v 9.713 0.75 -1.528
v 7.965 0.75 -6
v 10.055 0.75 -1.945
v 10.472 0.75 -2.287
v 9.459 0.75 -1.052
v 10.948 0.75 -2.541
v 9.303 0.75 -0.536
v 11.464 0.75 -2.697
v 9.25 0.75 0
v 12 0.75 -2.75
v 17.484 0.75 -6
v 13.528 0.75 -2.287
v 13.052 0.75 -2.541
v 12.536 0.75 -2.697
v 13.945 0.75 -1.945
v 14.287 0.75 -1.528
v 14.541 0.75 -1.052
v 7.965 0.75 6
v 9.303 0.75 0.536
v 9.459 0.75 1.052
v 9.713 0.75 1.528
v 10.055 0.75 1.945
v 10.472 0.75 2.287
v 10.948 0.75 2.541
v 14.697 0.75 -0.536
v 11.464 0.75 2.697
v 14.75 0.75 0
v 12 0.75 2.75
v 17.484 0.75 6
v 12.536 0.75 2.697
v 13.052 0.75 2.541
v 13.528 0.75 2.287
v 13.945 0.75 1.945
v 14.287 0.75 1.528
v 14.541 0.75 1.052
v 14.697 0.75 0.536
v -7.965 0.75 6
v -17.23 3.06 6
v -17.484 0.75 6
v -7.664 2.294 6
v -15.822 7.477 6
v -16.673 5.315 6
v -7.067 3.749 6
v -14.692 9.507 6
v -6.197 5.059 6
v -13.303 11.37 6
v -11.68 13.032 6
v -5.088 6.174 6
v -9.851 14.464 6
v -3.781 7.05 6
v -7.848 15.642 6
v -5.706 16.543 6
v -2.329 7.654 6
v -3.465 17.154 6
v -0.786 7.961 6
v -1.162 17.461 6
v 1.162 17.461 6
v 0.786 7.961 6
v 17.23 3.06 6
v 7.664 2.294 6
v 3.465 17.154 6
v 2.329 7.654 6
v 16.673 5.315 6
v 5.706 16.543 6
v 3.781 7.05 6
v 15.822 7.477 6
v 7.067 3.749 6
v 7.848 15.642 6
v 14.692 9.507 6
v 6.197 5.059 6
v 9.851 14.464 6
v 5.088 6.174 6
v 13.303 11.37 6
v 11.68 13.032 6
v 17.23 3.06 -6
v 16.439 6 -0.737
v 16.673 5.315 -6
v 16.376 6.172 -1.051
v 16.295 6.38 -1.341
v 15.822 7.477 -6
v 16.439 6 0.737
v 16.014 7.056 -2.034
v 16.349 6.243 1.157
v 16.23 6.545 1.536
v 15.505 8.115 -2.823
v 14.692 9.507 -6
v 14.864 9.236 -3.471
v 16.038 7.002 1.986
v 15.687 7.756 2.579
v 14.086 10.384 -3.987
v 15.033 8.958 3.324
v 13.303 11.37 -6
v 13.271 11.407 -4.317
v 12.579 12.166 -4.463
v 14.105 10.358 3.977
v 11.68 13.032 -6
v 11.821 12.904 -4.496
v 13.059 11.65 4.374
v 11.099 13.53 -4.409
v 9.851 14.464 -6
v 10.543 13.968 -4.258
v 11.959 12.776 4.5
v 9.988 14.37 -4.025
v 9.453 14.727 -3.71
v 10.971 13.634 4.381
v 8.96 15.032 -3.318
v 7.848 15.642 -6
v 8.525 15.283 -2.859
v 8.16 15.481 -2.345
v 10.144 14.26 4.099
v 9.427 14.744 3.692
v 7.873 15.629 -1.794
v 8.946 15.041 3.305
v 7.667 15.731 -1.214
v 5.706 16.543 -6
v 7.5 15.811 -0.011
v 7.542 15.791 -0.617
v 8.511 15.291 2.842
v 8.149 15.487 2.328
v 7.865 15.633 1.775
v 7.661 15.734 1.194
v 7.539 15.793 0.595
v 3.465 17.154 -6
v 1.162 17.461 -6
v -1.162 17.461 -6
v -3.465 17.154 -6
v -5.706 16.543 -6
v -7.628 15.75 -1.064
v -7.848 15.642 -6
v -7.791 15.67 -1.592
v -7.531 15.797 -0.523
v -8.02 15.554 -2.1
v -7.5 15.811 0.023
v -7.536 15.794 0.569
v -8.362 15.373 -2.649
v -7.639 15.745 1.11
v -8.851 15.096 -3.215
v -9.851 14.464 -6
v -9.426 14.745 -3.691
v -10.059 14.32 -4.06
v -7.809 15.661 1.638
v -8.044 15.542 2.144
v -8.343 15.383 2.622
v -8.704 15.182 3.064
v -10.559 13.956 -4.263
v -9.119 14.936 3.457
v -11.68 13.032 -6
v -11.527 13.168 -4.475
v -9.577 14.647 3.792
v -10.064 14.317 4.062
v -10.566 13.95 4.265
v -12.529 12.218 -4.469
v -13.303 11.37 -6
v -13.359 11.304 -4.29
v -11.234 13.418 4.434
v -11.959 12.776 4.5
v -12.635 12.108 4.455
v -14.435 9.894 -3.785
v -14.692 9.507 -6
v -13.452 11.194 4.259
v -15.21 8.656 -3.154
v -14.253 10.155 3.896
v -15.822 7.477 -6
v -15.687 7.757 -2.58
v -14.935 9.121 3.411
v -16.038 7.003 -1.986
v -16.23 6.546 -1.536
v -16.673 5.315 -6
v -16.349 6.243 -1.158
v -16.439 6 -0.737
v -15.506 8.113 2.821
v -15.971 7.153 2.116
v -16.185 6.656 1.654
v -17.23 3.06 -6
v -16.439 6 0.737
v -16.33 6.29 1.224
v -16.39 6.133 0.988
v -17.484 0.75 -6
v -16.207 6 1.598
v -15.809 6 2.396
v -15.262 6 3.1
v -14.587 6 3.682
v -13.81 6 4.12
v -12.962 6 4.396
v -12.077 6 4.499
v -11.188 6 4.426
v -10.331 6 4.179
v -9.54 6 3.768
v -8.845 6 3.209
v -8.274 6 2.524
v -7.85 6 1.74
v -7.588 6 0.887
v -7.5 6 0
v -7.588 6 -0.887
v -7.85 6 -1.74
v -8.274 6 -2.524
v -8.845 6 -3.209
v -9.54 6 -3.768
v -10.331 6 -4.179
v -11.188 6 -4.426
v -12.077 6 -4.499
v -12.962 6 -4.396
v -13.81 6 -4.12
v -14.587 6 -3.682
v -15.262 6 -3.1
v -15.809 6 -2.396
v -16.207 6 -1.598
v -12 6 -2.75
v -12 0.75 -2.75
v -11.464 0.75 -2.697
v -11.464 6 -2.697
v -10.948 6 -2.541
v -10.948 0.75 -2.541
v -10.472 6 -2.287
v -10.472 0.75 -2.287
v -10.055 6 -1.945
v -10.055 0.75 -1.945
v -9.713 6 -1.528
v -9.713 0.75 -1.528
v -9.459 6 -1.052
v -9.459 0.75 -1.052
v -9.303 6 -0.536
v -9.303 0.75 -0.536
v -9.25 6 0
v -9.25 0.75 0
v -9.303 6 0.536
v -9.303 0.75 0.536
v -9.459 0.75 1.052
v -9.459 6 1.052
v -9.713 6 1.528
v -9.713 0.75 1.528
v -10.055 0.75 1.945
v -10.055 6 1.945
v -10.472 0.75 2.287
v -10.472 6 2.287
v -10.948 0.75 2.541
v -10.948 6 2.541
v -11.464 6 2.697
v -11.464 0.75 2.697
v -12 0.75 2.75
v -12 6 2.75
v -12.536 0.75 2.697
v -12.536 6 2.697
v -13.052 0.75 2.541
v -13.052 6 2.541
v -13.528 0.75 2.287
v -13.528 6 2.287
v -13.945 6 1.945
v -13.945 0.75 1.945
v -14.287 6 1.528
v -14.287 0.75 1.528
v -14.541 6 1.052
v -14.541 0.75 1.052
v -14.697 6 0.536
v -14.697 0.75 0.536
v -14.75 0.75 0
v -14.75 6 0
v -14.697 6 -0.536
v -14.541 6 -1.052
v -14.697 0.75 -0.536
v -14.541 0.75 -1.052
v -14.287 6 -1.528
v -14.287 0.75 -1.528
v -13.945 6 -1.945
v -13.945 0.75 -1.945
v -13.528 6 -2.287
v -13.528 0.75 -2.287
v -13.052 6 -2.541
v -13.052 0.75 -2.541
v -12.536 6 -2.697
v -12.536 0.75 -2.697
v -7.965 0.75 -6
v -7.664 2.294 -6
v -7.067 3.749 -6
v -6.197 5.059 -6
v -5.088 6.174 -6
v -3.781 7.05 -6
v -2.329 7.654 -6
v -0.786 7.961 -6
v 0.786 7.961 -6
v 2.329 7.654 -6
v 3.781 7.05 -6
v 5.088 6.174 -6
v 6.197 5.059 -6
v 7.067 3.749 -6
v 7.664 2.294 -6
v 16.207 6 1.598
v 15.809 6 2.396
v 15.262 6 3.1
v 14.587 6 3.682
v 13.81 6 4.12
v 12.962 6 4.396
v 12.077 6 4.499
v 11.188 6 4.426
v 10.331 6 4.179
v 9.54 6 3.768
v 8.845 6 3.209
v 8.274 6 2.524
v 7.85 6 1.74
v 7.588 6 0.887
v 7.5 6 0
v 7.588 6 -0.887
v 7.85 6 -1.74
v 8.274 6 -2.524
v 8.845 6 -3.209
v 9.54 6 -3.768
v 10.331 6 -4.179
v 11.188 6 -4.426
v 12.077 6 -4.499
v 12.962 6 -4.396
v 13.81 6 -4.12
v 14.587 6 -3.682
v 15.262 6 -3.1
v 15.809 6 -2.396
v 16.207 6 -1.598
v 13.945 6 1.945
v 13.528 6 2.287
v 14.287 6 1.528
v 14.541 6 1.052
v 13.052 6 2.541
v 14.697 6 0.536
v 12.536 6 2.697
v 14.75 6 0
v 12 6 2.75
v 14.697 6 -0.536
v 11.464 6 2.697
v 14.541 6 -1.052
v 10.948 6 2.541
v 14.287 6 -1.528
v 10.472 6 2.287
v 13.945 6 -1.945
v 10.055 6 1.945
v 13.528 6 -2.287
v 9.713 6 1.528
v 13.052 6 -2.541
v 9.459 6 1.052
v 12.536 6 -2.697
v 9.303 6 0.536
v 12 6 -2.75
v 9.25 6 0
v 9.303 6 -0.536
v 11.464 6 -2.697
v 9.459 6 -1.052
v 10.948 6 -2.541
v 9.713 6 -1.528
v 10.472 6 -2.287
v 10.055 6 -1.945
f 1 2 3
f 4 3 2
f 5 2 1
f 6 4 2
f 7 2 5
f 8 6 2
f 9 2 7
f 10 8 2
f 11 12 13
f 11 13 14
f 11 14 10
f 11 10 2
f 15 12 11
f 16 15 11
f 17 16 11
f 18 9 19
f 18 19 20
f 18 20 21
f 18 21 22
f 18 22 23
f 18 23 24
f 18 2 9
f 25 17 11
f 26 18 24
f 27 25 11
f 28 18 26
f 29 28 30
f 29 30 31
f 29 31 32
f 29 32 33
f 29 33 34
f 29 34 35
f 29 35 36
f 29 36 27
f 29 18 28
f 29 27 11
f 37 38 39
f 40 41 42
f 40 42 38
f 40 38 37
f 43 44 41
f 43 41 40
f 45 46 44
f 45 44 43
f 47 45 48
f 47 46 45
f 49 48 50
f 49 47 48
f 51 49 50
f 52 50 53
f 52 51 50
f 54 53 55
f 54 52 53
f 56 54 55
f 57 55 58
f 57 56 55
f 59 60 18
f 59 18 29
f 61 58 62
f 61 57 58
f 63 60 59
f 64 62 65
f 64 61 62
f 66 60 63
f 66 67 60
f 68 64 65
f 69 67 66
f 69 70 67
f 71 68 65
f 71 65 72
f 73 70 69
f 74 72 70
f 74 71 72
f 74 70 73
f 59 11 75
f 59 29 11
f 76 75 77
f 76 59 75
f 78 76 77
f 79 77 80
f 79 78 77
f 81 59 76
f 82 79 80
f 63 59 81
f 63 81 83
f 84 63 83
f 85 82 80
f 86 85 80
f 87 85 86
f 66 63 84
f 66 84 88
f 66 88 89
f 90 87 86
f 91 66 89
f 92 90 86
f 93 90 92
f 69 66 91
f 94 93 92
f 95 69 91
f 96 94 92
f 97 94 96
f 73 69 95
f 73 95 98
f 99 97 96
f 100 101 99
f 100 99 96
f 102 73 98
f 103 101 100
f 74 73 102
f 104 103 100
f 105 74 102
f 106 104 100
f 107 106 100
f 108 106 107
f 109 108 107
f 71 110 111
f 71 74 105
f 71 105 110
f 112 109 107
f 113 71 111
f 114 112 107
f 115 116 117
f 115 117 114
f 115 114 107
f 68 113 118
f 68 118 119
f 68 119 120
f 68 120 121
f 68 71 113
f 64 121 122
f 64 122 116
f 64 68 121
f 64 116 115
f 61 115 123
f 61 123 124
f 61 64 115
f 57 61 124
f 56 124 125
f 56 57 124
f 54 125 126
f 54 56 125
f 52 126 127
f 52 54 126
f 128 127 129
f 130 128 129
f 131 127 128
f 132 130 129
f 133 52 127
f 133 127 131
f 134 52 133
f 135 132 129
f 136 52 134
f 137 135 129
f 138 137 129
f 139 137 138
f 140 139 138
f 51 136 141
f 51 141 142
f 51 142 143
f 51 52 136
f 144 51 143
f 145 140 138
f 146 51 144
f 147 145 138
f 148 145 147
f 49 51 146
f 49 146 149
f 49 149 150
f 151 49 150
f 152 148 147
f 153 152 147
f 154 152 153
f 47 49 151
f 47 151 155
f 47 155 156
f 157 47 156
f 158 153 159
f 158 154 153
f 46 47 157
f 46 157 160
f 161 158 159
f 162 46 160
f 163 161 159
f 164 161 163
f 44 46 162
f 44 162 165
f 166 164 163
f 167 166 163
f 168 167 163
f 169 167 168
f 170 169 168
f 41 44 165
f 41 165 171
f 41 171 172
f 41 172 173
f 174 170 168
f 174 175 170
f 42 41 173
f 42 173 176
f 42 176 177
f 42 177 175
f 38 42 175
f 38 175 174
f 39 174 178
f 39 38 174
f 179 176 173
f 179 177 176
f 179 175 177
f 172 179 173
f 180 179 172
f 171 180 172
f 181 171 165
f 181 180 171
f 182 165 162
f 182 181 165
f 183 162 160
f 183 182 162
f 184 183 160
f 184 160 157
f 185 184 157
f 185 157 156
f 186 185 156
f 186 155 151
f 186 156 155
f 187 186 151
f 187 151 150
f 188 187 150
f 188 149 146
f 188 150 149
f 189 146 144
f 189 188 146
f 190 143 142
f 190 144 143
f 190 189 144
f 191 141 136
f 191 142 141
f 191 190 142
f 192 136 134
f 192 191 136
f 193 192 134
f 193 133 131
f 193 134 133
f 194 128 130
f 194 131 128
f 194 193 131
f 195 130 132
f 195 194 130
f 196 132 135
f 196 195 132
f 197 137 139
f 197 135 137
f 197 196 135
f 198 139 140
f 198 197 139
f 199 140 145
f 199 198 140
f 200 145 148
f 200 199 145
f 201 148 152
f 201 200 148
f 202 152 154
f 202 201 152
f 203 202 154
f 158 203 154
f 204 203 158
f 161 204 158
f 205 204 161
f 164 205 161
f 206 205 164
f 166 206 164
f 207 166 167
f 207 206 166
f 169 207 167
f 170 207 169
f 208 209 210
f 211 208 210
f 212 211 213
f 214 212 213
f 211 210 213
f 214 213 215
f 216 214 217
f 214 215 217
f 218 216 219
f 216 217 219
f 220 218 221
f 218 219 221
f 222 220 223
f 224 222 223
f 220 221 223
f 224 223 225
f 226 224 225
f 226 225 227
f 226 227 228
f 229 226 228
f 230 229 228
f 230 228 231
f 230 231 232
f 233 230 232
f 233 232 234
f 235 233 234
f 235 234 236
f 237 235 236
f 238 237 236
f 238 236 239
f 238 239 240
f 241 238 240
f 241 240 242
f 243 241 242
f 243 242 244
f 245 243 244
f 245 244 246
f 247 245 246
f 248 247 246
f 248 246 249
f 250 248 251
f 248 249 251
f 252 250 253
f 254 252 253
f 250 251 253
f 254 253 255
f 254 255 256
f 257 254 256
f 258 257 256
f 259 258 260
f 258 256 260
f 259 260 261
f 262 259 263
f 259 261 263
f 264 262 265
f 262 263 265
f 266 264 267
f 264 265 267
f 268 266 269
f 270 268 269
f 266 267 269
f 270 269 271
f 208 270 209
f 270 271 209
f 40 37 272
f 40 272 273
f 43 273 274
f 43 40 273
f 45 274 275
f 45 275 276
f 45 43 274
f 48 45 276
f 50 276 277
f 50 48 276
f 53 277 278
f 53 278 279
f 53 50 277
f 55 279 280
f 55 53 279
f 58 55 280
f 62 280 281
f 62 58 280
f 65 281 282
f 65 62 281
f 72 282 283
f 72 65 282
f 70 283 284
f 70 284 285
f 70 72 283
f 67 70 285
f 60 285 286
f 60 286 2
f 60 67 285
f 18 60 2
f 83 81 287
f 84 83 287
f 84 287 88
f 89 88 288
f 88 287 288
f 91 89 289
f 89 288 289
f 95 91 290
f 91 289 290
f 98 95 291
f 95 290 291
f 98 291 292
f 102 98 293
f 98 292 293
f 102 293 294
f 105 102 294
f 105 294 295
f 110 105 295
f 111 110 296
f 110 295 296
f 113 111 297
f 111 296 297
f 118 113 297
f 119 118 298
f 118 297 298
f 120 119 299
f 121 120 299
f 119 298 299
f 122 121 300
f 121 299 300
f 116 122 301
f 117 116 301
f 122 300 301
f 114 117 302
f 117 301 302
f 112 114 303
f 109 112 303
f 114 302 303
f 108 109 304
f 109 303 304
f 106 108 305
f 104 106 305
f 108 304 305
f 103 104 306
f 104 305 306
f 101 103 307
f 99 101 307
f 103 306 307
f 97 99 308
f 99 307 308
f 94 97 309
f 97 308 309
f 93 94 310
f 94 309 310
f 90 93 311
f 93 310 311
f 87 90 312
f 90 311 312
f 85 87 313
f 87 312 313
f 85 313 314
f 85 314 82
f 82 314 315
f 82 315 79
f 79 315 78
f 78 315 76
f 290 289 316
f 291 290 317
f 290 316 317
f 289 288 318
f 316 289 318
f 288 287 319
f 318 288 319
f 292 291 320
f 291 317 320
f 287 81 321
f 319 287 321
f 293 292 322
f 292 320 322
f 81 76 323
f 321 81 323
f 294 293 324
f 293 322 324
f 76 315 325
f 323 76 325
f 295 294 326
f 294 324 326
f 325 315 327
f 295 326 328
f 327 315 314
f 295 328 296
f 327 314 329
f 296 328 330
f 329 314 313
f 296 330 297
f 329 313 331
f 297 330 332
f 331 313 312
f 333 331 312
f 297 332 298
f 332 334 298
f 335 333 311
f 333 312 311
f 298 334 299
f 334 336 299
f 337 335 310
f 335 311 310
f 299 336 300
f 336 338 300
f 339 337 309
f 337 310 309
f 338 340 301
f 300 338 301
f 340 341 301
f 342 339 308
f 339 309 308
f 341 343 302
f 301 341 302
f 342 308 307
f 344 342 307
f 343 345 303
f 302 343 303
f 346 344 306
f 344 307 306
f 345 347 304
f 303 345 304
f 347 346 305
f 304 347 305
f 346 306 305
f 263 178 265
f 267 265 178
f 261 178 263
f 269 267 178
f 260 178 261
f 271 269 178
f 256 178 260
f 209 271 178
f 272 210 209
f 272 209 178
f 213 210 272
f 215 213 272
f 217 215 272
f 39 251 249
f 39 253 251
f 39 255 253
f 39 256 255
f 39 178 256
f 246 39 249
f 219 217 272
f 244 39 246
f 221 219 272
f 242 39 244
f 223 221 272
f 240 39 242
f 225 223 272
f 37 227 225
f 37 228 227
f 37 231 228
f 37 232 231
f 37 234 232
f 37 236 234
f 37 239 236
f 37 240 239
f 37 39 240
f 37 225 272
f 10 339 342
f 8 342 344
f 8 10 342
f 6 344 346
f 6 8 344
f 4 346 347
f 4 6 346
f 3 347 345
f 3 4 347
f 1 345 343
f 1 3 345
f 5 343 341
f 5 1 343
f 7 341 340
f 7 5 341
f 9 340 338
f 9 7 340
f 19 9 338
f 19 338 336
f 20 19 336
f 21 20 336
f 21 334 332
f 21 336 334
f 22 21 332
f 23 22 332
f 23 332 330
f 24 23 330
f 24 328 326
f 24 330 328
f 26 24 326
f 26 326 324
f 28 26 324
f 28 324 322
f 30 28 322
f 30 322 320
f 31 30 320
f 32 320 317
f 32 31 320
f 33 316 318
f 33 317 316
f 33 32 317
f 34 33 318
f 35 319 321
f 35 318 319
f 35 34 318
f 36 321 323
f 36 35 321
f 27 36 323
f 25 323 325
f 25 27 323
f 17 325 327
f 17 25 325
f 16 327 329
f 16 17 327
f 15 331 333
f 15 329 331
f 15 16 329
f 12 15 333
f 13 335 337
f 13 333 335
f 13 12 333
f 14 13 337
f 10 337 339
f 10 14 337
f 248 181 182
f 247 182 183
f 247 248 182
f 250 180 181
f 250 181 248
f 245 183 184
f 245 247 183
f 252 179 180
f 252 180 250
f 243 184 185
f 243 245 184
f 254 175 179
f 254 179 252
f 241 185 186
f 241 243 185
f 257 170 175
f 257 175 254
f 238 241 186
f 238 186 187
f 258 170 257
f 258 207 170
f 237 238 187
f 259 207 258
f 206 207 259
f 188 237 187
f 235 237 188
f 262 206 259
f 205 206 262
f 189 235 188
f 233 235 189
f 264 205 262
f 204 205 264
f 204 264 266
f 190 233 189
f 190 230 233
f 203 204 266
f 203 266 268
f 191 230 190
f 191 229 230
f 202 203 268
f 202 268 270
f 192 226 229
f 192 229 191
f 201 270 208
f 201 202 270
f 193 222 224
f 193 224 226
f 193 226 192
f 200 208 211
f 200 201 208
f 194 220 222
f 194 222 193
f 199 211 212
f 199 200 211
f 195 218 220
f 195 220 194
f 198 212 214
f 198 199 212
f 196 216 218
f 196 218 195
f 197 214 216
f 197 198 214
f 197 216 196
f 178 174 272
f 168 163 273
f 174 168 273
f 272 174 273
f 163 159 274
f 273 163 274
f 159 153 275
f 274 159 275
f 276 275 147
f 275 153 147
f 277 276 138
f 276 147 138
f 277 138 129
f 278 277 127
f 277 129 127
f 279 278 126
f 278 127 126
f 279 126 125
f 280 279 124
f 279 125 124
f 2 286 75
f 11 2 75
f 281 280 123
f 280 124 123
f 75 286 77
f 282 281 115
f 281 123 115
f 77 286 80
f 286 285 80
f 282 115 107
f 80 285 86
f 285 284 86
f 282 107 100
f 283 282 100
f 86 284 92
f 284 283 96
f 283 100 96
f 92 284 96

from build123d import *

# Parameters (mm, degrees)
EXTRUDE_1_DEPTH     = 6
SKETCH_2_R          = 2.75
CUT_EXTRUDE_1_DEPTH = 25.944939367
CUT_EXTRUDE_START   = 6
SKETCH_3_R          = 4.5
CUT_EXTRUDE_2_DEPTH = 20.454616638


with BuildPart() as part:
    # 草图1 → 凸台-拉伸1 (new, symmetric)
    with BuildSketch(Plane.XY):
        with BuildLine():
            Line((-17.483921185, 0.75), (-7.964766161, 0.75))
            ThreePointArc((-7.964766161, 0.75), (0, 8), (7.964766161, 0.75))
            Line((7.964766161, 0.75), (17.483921185, 0.75))
            ThreePointArc((17.483921185, 0.75), (0, 17.5), (-17.483921185, 0.75))
        make_face()
    extrude(amount=EXTRUDE_1_DEPTH, both=True)

    # 草图2 → 切除-拉伸1 (cut, through all)
    with BuildSketch(Plane.XZ.offset(-0.75)):
        with Locations(Location((-12, 0, 0), (0, 0, 270))):
            Circle(SKETCH_2_R)
    cut_extrude_1 = extrude(amount=-CUT_EXTRUDE_1_DEPTH, mode=Mode.SUBTRACT)

    # 草图3 → 切除-拉伸2 (cut, through all)
    with BuildSketch(Plane(origin=(0, 0, 0), x_dir=(1, 0, 0), z_dir=(0, 1, 0)).offset(CUT_EXTRUDE_START)):
        with Locations((-12, 0)):
            Circle(SKETCH_3_R)
    cut_extrude_2 = extrude(amount=CUT_EXTRUDE_2_DEPTH, mode=Mode.SUBTRACT)

    # 镜向1: 切除-拉伸1, 切除-拉伸2 across plane
    add(cut_extrude_1.mirror(Plane(origin=(0, 0, 0), x_dir=(0, 0, 1), z_dir=(1, 0, 0))), mode=Mode.SUBTRACT)
    add(cut_extrude_2.mirror(Plane(origin=(0, 0, 0), x_dir=(0, 0, 1), z_dir=(1, 0, 0))), mode=Mode.SUBTRACT)


solid = part.part
